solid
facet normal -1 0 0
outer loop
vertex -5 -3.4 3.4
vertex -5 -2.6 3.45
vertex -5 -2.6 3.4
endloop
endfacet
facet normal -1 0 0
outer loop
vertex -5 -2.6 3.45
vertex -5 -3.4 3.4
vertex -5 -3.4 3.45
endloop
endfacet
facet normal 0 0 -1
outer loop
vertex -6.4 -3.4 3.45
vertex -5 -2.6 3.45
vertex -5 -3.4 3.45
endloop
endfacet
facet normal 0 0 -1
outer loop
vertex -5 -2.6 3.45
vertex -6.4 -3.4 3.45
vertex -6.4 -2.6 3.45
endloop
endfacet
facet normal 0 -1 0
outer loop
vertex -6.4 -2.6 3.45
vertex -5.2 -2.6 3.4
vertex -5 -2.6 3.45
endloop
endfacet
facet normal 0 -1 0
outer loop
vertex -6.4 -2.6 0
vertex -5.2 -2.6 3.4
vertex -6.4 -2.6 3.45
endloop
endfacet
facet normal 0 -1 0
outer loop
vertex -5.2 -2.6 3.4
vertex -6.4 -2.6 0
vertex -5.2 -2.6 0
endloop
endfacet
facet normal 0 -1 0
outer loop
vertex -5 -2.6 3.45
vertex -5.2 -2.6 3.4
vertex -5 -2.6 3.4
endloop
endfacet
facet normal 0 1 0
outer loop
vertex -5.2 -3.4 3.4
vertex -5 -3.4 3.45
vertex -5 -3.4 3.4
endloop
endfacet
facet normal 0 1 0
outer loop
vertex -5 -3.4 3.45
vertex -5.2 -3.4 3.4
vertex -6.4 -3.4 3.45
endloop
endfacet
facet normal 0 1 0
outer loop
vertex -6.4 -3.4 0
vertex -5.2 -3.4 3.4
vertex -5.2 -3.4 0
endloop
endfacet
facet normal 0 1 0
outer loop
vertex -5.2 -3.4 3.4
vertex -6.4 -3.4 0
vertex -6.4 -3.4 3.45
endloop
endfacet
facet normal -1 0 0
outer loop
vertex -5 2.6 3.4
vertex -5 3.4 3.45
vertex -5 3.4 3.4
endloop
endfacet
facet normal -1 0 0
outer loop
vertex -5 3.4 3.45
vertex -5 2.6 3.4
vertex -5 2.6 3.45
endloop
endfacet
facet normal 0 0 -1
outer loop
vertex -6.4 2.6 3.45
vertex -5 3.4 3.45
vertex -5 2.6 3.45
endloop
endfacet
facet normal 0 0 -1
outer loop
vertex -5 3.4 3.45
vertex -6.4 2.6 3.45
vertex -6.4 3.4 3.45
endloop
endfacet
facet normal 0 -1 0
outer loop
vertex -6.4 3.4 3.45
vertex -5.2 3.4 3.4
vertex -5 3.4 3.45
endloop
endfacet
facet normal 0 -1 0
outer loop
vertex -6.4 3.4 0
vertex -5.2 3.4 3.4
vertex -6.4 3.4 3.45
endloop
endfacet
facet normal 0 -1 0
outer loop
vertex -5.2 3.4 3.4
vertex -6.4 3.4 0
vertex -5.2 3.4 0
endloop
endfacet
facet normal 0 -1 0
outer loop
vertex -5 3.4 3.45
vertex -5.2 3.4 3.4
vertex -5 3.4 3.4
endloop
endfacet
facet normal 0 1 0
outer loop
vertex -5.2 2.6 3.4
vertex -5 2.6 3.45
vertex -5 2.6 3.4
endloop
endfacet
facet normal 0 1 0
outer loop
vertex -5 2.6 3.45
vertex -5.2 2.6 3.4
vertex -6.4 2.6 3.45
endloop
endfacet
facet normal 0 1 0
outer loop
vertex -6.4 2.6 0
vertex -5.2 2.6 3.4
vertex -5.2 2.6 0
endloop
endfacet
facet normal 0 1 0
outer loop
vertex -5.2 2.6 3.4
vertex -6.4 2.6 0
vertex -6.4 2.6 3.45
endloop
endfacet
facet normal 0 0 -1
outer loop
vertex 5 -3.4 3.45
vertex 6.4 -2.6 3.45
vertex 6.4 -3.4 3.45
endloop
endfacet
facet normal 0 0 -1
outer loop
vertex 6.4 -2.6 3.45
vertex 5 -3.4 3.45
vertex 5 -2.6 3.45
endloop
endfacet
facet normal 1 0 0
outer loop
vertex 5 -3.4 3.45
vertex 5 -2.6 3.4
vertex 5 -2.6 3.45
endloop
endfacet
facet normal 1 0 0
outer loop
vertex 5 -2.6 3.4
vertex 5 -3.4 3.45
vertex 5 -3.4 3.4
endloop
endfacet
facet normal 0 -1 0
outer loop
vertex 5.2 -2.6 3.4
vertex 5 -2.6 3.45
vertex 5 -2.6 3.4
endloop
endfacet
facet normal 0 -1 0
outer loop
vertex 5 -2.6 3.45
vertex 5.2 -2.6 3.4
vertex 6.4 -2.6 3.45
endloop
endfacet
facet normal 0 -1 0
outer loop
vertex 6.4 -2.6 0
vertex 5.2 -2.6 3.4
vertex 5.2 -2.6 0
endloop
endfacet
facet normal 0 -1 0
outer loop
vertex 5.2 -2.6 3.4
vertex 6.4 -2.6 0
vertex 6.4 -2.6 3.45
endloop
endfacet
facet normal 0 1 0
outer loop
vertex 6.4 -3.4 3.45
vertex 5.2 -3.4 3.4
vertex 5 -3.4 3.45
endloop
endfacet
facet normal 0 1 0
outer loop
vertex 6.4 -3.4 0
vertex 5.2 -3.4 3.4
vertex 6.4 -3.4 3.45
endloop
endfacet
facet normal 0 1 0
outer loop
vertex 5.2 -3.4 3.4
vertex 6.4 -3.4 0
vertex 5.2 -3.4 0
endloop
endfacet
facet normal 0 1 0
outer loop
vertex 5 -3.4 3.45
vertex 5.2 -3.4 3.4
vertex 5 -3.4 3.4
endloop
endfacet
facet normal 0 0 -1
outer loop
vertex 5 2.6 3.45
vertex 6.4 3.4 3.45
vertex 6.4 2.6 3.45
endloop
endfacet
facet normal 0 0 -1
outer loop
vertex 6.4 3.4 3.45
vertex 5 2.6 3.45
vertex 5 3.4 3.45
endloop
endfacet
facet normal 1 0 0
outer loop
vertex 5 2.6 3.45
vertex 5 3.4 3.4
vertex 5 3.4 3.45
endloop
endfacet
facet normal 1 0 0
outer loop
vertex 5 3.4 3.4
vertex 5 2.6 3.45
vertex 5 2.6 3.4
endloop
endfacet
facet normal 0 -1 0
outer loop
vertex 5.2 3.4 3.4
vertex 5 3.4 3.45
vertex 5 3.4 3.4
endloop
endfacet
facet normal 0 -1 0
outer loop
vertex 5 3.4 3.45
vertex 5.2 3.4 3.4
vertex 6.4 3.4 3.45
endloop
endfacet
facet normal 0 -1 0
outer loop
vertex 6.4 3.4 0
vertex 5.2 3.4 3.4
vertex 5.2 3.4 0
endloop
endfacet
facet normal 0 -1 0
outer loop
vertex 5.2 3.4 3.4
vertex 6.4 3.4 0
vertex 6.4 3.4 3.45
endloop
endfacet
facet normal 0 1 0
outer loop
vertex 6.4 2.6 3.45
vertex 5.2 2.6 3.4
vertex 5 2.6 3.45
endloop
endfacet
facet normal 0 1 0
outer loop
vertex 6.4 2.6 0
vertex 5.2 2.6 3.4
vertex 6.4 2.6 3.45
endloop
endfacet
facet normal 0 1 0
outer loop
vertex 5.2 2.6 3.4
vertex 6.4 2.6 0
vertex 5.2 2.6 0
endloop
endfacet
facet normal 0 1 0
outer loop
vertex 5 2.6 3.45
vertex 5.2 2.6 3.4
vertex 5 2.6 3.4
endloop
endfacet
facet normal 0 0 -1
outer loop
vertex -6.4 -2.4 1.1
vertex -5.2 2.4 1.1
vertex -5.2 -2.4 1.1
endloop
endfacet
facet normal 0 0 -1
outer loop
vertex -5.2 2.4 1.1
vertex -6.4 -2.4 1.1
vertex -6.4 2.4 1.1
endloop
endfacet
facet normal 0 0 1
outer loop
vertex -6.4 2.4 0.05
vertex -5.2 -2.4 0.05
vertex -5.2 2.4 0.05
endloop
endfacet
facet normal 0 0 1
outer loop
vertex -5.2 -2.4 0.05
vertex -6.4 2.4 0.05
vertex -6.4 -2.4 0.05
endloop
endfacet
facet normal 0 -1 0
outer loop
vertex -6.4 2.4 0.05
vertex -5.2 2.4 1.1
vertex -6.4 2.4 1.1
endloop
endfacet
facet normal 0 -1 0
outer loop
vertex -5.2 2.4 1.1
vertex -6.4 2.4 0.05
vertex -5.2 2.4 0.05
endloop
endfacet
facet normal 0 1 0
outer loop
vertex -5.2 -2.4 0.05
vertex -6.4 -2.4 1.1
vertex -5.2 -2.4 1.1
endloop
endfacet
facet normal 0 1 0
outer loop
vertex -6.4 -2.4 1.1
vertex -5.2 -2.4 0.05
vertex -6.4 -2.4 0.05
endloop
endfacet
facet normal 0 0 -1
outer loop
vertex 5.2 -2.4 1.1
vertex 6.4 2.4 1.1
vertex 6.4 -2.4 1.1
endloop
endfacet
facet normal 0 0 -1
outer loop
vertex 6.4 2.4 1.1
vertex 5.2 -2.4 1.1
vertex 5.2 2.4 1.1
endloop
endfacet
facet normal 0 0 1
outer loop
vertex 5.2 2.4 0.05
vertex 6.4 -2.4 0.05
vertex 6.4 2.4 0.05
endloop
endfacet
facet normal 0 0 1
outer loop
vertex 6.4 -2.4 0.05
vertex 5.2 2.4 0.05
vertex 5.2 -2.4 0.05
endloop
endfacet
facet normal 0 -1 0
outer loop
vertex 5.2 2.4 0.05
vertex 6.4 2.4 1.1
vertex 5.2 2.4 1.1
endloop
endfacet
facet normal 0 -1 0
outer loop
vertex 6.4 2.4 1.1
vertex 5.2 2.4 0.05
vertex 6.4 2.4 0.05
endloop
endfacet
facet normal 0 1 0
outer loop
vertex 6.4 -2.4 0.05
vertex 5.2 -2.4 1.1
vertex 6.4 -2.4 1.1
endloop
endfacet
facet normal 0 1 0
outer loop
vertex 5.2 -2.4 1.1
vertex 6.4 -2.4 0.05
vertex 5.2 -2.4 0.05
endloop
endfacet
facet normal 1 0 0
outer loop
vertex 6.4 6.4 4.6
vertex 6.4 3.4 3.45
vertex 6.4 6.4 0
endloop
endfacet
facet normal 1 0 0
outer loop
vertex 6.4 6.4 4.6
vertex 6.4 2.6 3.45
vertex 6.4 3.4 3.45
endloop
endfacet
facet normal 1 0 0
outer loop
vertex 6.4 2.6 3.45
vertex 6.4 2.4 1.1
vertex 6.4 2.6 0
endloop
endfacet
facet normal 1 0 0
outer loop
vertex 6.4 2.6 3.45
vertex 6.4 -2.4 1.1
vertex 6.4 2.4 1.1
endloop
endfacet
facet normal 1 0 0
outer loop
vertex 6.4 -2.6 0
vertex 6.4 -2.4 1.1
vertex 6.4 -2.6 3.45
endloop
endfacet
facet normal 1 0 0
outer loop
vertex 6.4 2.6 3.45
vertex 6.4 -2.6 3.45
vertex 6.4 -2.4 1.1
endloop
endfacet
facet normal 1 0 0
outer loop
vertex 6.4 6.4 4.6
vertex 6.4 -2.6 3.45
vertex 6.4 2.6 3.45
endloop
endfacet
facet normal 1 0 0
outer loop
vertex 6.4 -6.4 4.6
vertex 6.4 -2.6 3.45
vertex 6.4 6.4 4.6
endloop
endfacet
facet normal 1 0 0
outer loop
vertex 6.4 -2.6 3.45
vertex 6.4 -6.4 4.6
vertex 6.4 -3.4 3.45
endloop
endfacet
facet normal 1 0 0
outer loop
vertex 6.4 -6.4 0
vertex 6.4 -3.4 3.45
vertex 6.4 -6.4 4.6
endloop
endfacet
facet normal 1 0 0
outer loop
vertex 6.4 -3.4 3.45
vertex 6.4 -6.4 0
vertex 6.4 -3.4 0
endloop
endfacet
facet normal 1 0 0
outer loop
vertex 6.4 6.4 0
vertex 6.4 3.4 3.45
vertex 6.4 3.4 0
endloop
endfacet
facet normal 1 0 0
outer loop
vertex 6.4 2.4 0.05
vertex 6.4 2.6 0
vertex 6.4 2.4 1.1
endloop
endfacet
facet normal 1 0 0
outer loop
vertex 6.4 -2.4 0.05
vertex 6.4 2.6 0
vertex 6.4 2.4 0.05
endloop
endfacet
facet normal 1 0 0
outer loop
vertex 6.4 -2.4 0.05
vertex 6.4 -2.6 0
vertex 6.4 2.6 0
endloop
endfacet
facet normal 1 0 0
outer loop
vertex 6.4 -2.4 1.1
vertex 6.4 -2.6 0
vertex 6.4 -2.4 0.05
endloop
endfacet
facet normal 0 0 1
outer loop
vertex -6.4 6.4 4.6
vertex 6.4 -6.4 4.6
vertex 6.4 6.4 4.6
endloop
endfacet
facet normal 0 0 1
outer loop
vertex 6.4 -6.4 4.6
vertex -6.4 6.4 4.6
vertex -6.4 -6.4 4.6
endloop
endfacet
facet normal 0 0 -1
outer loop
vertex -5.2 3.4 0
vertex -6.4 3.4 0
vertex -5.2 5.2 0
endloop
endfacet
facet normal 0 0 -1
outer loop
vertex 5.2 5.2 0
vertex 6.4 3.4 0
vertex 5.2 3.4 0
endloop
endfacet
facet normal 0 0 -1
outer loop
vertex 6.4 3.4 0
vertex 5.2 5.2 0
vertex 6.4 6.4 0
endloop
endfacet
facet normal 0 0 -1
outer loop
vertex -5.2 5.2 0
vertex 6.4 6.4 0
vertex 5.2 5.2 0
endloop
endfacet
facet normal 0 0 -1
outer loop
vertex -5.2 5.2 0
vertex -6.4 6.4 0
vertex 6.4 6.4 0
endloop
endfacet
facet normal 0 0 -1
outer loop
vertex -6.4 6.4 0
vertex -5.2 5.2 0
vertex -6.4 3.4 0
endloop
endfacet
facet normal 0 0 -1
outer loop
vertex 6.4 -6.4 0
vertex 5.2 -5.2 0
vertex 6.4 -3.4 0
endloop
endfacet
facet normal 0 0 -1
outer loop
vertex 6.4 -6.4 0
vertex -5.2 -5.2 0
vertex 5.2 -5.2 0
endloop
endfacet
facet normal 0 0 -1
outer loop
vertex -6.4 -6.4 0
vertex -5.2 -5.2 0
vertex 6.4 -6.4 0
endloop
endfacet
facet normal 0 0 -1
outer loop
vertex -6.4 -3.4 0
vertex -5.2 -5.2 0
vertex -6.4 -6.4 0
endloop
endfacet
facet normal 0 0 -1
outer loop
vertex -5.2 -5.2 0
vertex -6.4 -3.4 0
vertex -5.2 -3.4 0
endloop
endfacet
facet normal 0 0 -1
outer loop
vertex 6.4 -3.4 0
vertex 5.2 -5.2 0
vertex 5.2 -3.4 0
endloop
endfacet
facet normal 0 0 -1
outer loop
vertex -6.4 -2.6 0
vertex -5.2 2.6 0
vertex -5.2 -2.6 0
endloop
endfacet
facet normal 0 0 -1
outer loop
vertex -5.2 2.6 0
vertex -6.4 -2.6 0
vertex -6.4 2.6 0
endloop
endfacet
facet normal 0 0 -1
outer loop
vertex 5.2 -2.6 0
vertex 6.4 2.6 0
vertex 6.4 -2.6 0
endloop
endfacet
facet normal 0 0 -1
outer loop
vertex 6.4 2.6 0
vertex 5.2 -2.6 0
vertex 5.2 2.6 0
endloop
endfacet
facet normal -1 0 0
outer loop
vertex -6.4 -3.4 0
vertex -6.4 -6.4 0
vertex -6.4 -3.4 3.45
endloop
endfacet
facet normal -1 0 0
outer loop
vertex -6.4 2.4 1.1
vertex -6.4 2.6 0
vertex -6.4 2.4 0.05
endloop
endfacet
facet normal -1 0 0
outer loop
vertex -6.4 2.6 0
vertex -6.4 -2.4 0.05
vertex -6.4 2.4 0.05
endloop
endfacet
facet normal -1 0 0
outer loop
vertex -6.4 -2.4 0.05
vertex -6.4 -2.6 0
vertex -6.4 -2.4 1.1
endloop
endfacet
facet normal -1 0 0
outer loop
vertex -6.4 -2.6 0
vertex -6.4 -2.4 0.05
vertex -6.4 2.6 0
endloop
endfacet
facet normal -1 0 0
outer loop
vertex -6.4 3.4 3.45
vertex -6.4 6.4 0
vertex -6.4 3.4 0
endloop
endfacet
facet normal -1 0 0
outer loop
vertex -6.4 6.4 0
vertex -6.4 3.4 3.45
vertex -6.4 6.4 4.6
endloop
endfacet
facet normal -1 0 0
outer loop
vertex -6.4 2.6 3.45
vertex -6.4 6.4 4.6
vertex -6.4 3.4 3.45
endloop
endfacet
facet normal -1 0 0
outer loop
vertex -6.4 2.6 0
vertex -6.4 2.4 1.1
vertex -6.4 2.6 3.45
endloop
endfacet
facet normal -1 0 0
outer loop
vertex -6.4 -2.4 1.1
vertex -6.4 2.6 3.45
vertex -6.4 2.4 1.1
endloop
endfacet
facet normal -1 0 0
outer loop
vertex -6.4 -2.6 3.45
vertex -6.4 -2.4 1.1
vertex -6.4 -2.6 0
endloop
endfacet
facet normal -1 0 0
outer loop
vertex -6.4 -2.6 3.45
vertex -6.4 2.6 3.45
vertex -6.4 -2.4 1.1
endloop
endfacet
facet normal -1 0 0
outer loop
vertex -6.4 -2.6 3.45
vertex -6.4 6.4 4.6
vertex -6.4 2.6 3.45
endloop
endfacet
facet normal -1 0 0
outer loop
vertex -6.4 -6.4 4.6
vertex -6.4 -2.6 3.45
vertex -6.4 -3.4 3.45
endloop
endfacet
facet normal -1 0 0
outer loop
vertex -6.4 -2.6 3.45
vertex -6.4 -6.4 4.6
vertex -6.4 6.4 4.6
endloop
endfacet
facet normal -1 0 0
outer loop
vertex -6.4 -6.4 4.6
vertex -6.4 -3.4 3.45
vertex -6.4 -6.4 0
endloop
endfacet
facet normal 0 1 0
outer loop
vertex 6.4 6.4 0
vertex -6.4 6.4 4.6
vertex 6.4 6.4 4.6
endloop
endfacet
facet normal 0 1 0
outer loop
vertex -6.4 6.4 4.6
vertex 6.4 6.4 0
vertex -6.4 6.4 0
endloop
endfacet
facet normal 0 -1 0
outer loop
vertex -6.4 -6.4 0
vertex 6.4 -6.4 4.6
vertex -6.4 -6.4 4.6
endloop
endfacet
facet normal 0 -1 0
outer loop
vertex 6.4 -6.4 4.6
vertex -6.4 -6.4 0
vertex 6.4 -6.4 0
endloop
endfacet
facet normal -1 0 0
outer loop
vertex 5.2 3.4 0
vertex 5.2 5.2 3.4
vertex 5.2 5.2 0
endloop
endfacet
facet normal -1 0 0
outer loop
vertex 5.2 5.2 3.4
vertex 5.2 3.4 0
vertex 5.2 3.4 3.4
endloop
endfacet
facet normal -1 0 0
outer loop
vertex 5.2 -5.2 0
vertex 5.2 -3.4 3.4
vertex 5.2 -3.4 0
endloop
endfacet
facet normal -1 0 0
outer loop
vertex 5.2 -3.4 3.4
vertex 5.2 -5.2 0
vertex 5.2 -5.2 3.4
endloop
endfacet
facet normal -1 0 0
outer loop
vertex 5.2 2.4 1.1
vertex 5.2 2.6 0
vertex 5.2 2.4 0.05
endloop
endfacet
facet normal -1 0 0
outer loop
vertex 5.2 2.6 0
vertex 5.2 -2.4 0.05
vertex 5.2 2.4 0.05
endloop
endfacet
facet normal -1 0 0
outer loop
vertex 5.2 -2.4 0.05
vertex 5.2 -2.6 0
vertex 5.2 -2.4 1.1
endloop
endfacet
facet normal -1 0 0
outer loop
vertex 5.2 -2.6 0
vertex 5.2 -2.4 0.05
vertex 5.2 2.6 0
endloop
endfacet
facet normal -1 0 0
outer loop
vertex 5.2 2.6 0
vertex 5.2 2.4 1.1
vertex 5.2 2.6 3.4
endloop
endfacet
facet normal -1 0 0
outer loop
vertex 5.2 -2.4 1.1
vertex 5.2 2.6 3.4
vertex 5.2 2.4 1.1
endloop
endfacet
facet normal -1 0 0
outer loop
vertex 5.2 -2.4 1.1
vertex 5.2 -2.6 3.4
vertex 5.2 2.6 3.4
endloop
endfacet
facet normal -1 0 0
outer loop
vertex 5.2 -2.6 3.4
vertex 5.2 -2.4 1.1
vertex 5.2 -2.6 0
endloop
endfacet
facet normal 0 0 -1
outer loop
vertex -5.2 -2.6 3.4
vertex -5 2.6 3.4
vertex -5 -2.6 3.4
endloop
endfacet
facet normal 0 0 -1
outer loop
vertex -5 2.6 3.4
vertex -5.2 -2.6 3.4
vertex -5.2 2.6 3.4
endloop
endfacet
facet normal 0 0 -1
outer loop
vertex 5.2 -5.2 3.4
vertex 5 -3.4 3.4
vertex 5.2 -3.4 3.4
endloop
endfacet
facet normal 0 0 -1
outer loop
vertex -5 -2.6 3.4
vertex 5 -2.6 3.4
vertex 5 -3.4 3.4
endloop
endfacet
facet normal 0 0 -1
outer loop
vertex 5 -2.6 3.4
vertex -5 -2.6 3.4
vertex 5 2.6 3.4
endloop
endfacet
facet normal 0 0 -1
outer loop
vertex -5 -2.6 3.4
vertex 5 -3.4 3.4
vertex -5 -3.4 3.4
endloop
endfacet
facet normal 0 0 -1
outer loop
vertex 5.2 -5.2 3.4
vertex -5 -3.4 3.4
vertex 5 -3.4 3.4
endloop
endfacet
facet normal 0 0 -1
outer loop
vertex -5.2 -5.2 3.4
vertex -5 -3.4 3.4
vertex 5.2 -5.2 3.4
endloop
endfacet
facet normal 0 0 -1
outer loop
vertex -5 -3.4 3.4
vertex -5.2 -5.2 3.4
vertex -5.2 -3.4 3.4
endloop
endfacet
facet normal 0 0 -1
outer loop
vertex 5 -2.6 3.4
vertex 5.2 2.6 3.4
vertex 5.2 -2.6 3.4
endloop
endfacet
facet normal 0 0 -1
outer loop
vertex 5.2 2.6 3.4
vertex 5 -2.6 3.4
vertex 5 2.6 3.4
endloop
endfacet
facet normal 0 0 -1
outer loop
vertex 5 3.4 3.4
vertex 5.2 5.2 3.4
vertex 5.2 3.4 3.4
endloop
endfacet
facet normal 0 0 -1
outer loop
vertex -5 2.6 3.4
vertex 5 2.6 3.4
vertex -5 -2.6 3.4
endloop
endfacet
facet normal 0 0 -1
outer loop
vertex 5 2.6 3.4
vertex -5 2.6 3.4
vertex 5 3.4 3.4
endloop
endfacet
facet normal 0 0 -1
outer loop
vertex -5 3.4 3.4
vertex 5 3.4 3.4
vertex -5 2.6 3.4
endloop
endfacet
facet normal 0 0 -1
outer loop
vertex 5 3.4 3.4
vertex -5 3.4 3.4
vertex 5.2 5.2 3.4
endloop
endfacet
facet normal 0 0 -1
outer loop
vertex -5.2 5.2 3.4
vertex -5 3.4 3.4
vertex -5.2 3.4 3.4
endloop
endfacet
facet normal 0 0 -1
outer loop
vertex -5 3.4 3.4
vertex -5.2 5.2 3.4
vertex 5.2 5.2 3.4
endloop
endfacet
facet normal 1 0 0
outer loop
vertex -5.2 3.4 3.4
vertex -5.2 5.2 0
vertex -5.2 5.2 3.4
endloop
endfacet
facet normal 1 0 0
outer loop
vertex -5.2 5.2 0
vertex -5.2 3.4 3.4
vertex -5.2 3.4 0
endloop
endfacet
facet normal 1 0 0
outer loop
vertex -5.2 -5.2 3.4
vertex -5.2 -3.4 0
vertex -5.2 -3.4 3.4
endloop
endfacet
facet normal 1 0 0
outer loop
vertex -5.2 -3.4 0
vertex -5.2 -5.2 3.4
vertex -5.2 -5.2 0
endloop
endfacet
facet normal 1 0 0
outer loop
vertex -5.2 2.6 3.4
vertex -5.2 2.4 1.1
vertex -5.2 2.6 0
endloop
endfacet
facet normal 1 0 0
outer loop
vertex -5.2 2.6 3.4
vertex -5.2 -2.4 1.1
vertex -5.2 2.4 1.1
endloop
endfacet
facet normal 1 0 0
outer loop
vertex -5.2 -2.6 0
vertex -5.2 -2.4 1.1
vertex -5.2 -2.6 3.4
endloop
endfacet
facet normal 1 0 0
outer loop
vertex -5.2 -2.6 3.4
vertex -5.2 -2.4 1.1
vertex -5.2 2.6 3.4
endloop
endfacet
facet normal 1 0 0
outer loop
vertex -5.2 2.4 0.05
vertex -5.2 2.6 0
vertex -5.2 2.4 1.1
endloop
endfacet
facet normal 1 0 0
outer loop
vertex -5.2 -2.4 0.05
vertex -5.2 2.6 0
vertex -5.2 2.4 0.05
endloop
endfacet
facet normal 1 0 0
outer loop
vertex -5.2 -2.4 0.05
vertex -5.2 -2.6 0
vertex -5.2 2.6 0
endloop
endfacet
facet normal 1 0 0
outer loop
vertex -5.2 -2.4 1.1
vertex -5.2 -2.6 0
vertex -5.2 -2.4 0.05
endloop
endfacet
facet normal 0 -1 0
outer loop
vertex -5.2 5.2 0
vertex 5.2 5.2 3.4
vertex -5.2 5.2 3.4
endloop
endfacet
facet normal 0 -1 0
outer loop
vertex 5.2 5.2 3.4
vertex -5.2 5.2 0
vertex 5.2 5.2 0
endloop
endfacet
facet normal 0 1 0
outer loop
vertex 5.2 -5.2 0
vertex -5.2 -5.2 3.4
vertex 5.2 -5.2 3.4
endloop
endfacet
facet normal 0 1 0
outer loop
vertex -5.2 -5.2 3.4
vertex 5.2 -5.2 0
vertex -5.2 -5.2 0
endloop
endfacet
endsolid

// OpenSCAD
// file: ../lib/at01_inverted_core_snap.scad
// File: at01_inverted_core_snap.scad
// AT-01 — experiment-owned inverted fixed-core / removable-shell snap.
//
// This geometry does not copy the QuackWorks/OpenGrid snap. It keeps only the
// high-level design lessons: compact fixed side, removable compliant side,
// explicit locating/retention roles, and a Lite-like 4.0 / 3.4 mm Z baseline.

// Fixed-side baseline.
AT01_CORE_SIZE = 10.0;
AT01_CORE_HEIGHT = 4.0;
AT01_ROOT_SHOULDER = 0.6;
AT01_ENGAGEMENT_HEIGHT = 3.4;

// Removable shell.
AT01_CLEARANCE = 0.20;              // per side on nominal 10 x 10 core
AT01_SHELL_WALL = 1.20;
AT01_SHELL_TOP = 1.20;
AT01_SHELL_INNER = AT01_CORE_SIZE + 2 * AT01_CLEARANCE;
AT01_SHELL_OUTER = AT01_SHELL_INNER + 2 * AT01_SHELL_WALL;
AT01_SHELL_HEIGHT = AT01_ENGAGEMENT_HEIGHT + AT01_SHELL_TOP;

// Two-sided retention on +/-X.
AT01_RIB_PROTRUSION = 0.35;
AT01_RIB_WIDTH = 4.0;
AT01_RIB_Z_BOTTOM = 0.75;
AT01_RIB_Z_LOWER_MAX = 0.95;
AT01_RIB_Z_UPPER_MAX = 1.15;
AT01_RIB_Z_TOP = 1.60;

// Receiving window in each compliant shell tongue.
// Values are shell-local; assembled shell starts at Z=AT01_ROOT_SHOULDER.
AT01_WINDOW_WIDTH = 4.8;
AT01_WINDOW_Z_MIN = 0.05;
AT01_WINDOW_Z_MAX = 1.10;

// Two relief slots isolate the center tongue on each +/-X wall.
AT01_FLEX_SLOT_Y = 3.0;
AT01_FLEX_SLOT_WIDTH = 0.8;

// Evidence helpers.
AT01_EXPLODED_Z = 8.0;
AT01_PROFILE_SLICE = 1.0;

assert(
    abs(AT01_ROOT_SHOULDER + AT01_ENGAGEMENT_HEIGHT - AT01_CORE_HEIGHT) < 0.0001,
    "AT-01 Lite baseline must satisfy shoulder + engagement = 4.0 mm."
);
assert(
    abs(AT01_SHELL_INNER - (AT01_CORE_SIZE + 2 * AT01_CLEARANCE)) < 0.0001,
    "AT-01 shell inner size must preserve the stated side clearance."
);

module _at01_positive_x_retention_rib() {
    // Polygon is defined in X/Z and extruded along Y.
    rotate([90, 0, 0])
        linear_extrude(height = AT01_RIB_WIDTH, center = true, convexity = 10)
            polygon(points = [
                [AT01_CORE_SIZE / 2, AT01_RIB_Z_BOTTOM],
                [AT01_CORE_SIZE / 2 + AT01_RIB_PROTRUSION, AT01_RIB_Z_LOWER_MAX],
                [AT01_CORE_SIZE / 2 + AT01_RIB_PROTRUSION, AT01_RIB_Z_UPPER_MAX],
                [AT01_CORE_SIZE / 2, AT01_RIB_Z_TOP]
            ]);
}

module at01_fixed_core() {
    union() {
        translate([-AT01_CORE_SIZE / 2, -AT01_CORE_SIZE / 2, 0])
            cube([AT01_CORE_SIZE, AT01_CORE_SIZE, AT01_CORE_HEIGHT]);

        _at01_positive_x_retention_rib();

        mirror([1, 0, 0])
            _at01_positive_x_retention_rib();
    }
}

module _at01_shell_outer() {
    translate([-AT01_SHELL_OUTER / 2, -AT01_SHELL_OUTER / 2, 0])
        cube([AT01_SHELL_OUTER, AT01_SHELL_OUTER, AT01_SHELL_HEIGHT]);
}

module _at01_shell_cavity() {
    // Ends exactly at the underside of the top plate.
    translate([-AT01_SHELL_INNER / 2, -AT01_SHELL_INNER / 2, -0.05])
        cube([AT01_SHELL_INNER, AT01_SHELL_INNER, AT01_ENGAGEMENT_HEIGHT + 0.05]);
}

module _at01_retention_window(x_sign = 1) {
    wall_center = (AT01_SHELL_INNER / 2 + AT01_SHELL_OUTER / 2) / 2;
    translate([
        x_sign * wall_center,
        0,
        (AT01_WINDOW_Z_MIN + AT01_WINDOW_Z_MAX) / 2
    ])
        cube([
            AT01_SHELL_WALL + 0.4,
            AT01_WINDOW_WIDTH,
            AT01_WINDOW_Z_MAX - AT01_WINDOW_Z_MIN
        ], center = true);
}

module _at01_flex_slot(x_sign = 1, y_sign = 1) {
    wall_center = (AT01_SHELL_INNER / 2 + AT01_SHELL_OUTER / 2) / 2;
    translate([
        x_sign * wall_center,
        y_sign * AT01_FLEX_SLOT_Y,
        AT01_ENGAGEMENT_HEIGHT / 2
    ])
        cube([
            AT01_SHELL_WALL + 0.4,
            AT01_FLEX_SLOT_WIDTH,
            AT01_ENGAGEMENT_HEIGHT + 0.10
        ], center = true);
}

module at01_removable_shell() {
    difference() {
        _at01_shell_outer();
        _at01_shell_cavity();

        for (x_sign = [-1, 1]) {
            _at01_retention_window(x_sign);

            for (y_sign = [-1, 1])
                _at01_flex_slot(x_sign, y_sign);
        }
    }
}

module at01_assembled(shell_alpha = 0.55) {
    color([0.68, 0.70, 0.74])
        at01_fixed_core();

    translate([0, 0, AT01_ROOT_SHOULDER])
        color([0.92, 0.30, 0.12, shell_alpha])
            at01_removable_shell();
}

module at01_exploded() {
    color([0.68, 0.70, 0.74])
        at01_fixed_core();

    translate([0, 0, AT01_ROOT_SHOULDER + AT01_EXPLODED_Z])
        color([0.92, 0.30, 0.12])
            at01_removable_shell();
}

module _at01_retention_slice_volume() {
    translate([-20, -AT01_PROFILE_SLICE / 2, -1])
        cube([40, AT01_PROFILE_SLICE, 12]);
}

module _at01_locating_slice_volume() {
    translate([-AT01_PROFILE_SLICE / 2, -20, -1])
        cube([AT01_PROFILE_SLICE, 40, 12]);
}

module at01_fixed_retention_profile() {
    intersection() {
        at01_fixed_core();
        _at01_retention_slice_volume();
    }
}

module at01_shell_retention_profile() {
    intersection() {
        at01_removable_shell();
        translate([0, 0, -AT01_ROOT_SHOULDER])
            _at01_retention_slice_volume();
    }
}

module at01_fixed_locating_profile() {
    intersection() {
        at01_fixed_core();
        _at01_locating_slice_volume();
    }
}

module at01_shell_locating_profile() {
    intersection() {
        at01_removable_shell();
        translate([0, 0, -AT01_ROOT_SHOULDER])
            _at01_locating_slice_volume();
    }
}

module at01_retention_section() {
    color([0.68, 0.70, 0.74])
        at01_fixed_retention_profile();

    translate([0, 0, AT01_ROOT_SHOULDER])
        color([0.92, 0.30, 0.12])
            at01_shell_retention_profile();
}

module at01_locating_section() {
    color([0.68, 0.70, 0.74])
        at01_fixed_locating_profile();

    translate([0, 0, AT01_ROOT_SHOULDER])
        color([0.92, 0.30, 0.12])
            at01_shell_locating_profile();
}
// main file
include <../lib/at01_inverted_core_snap.scad>
at01_removable_shell();
